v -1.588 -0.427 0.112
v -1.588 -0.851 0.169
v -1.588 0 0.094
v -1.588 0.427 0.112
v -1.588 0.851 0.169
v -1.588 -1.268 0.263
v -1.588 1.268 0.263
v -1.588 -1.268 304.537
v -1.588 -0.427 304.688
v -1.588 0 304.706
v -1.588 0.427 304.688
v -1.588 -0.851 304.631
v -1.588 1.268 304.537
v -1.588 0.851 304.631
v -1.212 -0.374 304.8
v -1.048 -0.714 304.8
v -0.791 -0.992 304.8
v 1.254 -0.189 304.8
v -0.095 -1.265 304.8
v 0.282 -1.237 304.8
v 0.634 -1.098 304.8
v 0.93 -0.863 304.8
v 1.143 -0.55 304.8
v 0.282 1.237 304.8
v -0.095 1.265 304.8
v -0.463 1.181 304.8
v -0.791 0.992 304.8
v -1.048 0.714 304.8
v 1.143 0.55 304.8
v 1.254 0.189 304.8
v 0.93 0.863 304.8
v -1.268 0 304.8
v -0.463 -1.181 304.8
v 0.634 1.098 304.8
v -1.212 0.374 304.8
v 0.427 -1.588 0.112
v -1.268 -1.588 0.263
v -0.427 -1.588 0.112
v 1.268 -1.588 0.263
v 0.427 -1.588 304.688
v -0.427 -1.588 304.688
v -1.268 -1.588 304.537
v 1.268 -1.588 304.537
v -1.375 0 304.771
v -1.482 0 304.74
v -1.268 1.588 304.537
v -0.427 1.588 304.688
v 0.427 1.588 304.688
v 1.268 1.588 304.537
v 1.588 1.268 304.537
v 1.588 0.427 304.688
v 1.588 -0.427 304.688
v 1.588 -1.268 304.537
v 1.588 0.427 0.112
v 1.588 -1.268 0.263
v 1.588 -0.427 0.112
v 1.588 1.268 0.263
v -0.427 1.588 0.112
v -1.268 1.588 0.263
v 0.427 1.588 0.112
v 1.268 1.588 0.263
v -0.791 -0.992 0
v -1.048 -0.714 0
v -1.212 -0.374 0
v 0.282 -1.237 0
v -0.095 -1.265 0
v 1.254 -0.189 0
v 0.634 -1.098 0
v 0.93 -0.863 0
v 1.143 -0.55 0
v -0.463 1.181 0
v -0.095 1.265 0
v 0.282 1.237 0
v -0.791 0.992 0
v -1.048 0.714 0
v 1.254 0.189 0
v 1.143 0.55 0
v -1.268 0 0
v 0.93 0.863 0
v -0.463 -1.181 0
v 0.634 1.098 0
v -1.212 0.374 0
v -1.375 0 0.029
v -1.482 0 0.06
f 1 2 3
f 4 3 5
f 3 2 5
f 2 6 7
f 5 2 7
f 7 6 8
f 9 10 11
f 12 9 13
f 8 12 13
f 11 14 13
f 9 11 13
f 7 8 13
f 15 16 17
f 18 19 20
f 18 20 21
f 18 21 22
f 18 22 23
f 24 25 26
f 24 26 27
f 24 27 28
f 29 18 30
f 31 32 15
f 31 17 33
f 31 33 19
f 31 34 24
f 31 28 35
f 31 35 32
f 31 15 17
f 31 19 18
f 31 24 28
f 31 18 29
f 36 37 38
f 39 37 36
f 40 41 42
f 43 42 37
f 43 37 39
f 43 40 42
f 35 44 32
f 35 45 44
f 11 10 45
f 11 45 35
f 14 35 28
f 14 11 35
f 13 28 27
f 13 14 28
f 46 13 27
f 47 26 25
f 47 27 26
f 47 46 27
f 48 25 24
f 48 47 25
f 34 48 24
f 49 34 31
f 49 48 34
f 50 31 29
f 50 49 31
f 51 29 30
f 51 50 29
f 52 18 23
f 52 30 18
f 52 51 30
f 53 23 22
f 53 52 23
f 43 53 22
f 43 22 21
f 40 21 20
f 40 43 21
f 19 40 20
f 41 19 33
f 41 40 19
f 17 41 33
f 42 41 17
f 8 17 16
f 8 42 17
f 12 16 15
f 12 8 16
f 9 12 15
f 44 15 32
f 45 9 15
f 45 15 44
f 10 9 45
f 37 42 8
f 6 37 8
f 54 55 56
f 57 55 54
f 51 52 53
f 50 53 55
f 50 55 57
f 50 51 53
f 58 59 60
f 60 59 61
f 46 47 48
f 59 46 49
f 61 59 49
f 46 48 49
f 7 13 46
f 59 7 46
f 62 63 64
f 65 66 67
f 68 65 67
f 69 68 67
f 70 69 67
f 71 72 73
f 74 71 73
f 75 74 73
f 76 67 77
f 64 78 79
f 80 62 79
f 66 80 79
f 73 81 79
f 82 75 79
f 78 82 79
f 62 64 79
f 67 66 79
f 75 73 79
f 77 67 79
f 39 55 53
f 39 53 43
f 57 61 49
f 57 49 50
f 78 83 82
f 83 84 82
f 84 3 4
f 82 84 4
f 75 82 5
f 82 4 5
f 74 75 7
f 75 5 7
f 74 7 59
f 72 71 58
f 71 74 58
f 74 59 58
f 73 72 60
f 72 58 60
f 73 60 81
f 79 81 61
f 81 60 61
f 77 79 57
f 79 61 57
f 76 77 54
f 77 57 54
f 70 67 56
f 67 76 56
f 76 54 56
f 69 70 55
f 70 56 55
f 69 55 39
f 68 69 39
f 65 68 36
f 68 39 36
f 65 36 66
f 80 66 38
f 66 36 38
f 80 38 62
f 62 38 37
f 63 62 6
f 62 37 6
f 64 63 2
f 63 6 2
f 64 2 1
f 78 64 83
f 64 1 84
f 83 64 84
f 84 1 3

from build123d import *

# Parameters (mm, degrees)
SKETCH1_W           = 3.175
SKETCH1_H           = 3.175
BOSS_EXTRUDE1_DEPTH = 152.4
SKETCH2_OUTSIDE_W   = 35.668
SKETCH2_OUTSIDE_H   = 35.668
SKETCH2_OUTSIDE_R   = 2.032
CUT_EXTRUDE1_DEPTH  = 153.4


with BuildPart() as part:
    # Sketch1 → Boss-Extrude1 (new body)
    with BuildSketch(Plane.XY):
        Rectangle(SKETCH1_W, SKETCH1_H)
    extrude(amount=BOSS_EXTRUDE1_DEPTH)

    # Sketch2 outside → Cut-Extrude1 (cut, through all)
    with BuildSketch(Plane(origin=(0, 0, 0), x_dir=(-1, 0, 0), z_dir=(0, 0, -1))):
        Rectangle(SKETCH2_OUTSIDE_W, SKETCH2_OUTSIDE_H)
        Circle(SKETCH2_OUTSIDE_R, mode=Mode.SUBTRACT)
    extrude(amount=-CUT_EXTRUDE1_DEPTH, mode=Mode.SUBTRACT)

    # Sketch3 → Cut-Revolve1 (revolve, cut)
    with BuildSketch(Plane(origin=(0, 0, 0), x_dir=(1, 0, 0), z_dir=(0, 1, 0))):
        with BuildLine():
            Line((-5.053685963, -4.40273269), (-5.053685963, 5.740530545))
            Line((-5.053685963, 5.740530545), (0, 5.740530545))
            Line((0, 5.740530545), (0, 0.160877736))
            ThreePointArc((0, 0.160877736), (-3.404639553, -1.148866368), (-5.053685963, -4.40273269))
        make_face()
    revolve(axis=Axis((0, 0, 152.4), (0, 0, -1)), mode=Mode.SUBTRACT)

    # Mirror1: part across plane


with BuildPart() as part_1:
    add(part.part)
    add(part.part.mirror(Plane(origin=(0, 0, 152.4), x_dir=(1, 0, 0), z_dir=(0, 0, -1))))


solid = part_1.part
